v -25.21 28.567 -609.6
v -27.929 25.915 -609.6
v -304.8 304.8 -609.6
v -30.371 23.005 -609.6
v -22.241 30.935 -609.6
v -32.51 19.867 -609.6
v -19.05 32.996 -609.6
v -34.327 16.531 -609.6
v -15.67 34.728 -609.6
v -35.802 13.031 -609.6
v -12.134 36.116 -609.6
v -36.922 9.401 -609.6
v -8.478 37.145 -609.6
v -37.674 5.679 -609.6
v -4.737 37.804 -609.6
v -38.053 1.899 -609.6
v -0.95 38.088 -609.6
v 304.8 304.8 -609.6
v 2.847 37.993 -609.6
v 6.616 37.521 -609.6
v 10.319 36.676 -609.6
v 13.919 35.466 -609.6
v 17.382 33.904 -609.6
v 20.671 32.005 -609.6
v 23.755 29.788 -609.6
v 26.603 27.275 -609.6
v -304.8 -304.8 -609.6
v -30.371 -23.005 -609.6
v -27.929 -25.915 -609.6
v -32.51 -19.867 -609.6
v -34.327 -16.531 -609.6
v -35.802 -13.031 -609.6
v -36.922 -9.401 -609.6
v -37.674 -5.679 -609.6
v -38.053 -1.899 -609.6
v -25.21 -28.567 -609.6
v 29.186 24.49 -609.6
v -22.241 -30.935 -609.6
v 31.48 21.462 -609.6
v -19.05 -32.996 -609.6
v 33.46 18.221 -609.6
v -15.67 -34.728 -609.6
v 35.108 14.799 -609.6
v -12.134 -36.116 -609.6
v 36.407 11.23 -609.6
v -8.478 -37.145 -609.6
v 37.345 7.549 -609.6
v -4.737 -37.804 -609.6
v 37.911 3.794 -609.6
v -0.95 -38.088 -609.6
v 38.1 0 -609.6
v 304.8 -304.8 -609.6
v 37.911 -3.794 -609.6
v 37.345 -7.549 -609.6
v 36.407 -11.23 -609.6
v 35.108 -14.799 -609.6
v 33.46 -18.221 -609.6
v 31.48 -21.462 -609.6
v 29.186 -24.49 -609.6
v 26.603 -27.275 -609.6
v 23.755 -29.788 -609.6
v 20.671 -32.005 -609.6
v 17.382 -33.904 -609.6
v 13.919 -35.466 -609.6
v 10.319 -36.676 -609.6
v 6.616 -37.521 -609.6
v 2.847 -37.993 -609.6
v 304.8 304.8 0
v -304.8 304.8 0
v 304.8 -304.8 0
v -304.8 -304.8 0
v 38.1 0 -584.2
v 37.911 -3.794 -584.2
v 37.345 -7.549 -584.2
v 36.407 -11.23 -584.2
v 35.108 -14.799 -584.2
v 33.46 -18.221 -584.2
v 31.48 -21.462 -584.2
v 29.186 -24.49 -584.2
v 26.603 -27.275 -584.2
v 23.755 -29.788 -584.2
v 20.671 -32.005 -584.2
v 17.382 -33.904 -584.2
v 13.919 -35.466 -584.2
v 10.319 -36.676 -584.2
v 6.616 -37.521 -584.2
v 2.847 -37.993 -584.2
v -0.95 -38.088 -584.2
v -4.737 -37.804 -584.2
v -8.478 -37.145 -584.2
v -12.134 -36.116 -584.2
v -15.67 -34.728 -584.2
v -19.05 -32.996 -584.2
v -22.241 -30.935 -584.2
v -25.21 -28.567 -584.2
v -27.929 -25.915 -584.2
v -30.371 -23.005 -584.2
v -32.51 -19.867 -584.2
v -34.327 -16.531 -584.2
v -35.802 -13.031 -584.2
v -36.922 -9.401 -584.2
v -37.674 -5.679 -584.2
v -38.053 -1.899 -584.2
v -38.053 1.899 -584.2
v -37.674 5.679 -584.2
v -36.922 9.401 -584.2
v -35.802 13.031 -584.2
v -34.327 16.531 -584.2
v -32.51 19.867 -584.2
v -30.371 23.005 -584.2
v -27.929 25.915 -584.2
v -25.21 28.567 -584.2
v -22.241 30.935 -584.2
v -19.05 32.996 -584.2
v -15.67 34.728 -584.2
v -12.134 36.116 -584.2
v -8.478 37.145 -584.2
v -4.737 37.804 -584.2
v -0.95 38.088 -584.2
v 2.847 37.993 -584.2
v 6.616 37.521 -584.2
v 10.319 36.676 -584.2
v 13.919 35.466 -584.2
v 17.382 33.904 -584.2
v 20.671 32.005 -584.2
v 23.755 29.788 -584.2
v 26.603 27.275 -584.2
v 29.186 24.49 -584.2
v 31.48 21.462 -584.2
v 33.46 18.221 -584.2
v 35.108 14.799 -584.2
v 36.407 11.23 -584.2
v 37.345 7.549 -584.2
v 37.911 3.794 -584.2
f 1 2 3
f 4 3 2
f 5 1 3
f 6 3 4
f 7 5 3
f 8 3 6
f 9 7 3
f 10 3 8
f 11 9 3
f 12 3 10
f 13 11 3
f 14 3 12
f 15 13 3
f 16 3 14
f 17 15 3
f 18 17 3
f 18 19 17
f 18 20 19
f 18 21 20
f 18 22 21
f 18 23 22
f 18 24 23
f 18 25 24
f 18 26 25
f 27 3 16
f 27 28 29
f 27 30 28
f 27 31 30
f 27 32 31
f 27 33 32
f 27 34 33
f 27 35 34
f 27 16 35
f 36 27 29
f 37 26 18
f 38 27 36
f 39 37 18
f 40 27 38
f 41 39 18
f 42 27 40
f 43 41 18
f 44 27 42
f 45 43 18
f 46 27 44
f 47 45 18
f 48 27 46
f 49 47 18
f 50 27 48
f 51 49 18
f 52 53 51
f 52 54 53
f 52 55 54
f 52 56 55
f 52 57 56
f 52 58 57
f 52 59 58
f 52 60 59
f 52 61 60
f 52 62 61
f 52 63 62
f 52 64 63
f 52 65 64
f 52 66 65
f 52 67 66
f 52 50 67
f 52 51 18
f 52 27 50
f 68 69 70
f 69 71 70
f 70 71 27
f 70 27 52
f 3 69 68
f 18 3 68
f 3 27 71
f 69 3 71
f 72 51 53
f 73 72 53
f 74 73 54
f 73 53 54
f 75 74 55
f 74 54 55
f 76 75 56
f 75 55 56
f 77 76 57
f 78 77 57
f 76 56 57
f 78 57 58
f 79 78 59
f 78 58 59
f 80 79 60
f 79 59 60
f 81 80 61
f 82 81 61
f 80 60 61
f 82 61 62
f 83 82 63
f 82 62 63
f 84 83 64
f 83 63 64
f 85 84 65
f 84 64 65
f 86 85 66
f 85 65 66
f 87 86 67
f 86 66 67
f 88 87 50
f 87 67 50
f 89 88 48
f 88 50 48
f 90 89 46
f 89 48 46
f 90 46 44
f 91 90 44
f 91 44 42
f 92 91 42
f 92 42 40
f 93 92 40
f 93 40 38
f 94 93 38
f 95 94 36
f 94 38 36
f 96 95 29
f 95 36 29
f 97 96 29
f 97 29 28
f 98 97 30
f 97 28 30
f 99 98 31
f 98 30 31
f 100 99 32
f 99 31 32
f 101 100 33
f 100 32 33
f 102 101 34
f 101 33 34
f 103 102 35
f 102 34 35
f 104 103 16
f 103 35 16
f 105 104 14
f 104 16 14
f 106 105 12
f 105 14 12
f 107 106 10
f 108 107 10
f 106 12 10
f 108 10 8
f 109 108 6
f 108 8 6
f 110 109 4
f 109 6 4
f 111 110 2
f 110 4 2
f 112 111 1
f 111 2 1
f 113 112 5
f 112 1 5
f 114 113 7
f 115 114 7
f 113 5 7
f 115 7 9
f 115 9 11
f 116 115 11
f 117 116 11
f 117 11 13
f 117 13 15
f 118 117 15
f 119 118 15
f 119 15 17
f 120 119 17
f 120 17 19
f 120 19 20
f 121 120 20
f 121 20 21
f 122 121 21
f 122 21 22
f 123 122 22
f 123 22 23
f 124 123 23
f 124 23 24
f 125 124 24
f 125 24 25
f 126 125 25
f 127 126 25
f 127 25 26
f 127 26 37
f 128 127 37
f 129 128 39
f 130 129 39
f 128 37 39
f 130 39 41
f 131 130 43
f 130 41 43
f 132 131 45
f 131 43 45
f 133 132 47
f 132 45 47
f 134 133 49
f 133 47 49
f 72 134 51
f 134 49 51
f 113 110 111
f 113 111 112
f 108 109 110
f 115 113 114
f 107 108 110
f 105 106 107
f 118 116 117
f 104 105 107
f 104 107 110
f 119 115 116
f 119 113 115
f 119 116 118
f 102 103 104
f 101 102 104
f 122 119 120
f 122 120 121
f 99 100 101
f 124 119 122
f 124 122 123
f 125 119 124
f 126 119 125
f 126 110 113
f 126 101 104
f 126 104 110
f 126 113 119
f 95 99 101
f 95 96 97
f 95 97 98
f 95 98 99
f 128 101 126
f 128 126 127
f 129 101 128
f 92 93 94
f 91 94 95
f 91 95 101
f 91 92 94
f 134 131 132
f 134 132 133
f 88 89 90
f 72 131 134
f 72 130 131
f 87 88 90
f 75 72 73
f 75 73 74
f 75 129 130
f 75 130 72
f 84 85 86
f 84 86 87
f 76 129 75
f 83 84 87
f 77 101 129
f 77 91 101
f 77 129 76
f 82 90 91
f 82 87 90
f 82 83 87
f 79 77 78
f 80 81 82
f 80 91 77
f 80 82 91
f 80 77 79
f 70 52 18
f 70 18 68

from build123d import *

# Parameters (mm, degrees)
F0_W     = 609.6
F0_H     = 609.6
F1_DEPTH = 304.8
F2_R     = 38.1
F3_DEPTH = 25.4


with BuildPart() as f1:
    # F0 (on Front) → F1 (new body, symmetric)
    with BuildSketch(Plane.XZ):
        with Locations((0, -304.8)):
            Rectangle(F0_W, F0_H)
    extrude(amount=F1_DEPTH, both=True)

    # F2 (on face) → F3 (cut)
    with BuildSketch(Plane(origin=(0, 0, -609.6), x_dir=(1, 0, 0), z_dir=(0, 0, -1))):
        Circle(F2_R)
    extrude(amount=-F3_DEPTH, mode=Mode.SUBTRACT)


solid = f1.part
